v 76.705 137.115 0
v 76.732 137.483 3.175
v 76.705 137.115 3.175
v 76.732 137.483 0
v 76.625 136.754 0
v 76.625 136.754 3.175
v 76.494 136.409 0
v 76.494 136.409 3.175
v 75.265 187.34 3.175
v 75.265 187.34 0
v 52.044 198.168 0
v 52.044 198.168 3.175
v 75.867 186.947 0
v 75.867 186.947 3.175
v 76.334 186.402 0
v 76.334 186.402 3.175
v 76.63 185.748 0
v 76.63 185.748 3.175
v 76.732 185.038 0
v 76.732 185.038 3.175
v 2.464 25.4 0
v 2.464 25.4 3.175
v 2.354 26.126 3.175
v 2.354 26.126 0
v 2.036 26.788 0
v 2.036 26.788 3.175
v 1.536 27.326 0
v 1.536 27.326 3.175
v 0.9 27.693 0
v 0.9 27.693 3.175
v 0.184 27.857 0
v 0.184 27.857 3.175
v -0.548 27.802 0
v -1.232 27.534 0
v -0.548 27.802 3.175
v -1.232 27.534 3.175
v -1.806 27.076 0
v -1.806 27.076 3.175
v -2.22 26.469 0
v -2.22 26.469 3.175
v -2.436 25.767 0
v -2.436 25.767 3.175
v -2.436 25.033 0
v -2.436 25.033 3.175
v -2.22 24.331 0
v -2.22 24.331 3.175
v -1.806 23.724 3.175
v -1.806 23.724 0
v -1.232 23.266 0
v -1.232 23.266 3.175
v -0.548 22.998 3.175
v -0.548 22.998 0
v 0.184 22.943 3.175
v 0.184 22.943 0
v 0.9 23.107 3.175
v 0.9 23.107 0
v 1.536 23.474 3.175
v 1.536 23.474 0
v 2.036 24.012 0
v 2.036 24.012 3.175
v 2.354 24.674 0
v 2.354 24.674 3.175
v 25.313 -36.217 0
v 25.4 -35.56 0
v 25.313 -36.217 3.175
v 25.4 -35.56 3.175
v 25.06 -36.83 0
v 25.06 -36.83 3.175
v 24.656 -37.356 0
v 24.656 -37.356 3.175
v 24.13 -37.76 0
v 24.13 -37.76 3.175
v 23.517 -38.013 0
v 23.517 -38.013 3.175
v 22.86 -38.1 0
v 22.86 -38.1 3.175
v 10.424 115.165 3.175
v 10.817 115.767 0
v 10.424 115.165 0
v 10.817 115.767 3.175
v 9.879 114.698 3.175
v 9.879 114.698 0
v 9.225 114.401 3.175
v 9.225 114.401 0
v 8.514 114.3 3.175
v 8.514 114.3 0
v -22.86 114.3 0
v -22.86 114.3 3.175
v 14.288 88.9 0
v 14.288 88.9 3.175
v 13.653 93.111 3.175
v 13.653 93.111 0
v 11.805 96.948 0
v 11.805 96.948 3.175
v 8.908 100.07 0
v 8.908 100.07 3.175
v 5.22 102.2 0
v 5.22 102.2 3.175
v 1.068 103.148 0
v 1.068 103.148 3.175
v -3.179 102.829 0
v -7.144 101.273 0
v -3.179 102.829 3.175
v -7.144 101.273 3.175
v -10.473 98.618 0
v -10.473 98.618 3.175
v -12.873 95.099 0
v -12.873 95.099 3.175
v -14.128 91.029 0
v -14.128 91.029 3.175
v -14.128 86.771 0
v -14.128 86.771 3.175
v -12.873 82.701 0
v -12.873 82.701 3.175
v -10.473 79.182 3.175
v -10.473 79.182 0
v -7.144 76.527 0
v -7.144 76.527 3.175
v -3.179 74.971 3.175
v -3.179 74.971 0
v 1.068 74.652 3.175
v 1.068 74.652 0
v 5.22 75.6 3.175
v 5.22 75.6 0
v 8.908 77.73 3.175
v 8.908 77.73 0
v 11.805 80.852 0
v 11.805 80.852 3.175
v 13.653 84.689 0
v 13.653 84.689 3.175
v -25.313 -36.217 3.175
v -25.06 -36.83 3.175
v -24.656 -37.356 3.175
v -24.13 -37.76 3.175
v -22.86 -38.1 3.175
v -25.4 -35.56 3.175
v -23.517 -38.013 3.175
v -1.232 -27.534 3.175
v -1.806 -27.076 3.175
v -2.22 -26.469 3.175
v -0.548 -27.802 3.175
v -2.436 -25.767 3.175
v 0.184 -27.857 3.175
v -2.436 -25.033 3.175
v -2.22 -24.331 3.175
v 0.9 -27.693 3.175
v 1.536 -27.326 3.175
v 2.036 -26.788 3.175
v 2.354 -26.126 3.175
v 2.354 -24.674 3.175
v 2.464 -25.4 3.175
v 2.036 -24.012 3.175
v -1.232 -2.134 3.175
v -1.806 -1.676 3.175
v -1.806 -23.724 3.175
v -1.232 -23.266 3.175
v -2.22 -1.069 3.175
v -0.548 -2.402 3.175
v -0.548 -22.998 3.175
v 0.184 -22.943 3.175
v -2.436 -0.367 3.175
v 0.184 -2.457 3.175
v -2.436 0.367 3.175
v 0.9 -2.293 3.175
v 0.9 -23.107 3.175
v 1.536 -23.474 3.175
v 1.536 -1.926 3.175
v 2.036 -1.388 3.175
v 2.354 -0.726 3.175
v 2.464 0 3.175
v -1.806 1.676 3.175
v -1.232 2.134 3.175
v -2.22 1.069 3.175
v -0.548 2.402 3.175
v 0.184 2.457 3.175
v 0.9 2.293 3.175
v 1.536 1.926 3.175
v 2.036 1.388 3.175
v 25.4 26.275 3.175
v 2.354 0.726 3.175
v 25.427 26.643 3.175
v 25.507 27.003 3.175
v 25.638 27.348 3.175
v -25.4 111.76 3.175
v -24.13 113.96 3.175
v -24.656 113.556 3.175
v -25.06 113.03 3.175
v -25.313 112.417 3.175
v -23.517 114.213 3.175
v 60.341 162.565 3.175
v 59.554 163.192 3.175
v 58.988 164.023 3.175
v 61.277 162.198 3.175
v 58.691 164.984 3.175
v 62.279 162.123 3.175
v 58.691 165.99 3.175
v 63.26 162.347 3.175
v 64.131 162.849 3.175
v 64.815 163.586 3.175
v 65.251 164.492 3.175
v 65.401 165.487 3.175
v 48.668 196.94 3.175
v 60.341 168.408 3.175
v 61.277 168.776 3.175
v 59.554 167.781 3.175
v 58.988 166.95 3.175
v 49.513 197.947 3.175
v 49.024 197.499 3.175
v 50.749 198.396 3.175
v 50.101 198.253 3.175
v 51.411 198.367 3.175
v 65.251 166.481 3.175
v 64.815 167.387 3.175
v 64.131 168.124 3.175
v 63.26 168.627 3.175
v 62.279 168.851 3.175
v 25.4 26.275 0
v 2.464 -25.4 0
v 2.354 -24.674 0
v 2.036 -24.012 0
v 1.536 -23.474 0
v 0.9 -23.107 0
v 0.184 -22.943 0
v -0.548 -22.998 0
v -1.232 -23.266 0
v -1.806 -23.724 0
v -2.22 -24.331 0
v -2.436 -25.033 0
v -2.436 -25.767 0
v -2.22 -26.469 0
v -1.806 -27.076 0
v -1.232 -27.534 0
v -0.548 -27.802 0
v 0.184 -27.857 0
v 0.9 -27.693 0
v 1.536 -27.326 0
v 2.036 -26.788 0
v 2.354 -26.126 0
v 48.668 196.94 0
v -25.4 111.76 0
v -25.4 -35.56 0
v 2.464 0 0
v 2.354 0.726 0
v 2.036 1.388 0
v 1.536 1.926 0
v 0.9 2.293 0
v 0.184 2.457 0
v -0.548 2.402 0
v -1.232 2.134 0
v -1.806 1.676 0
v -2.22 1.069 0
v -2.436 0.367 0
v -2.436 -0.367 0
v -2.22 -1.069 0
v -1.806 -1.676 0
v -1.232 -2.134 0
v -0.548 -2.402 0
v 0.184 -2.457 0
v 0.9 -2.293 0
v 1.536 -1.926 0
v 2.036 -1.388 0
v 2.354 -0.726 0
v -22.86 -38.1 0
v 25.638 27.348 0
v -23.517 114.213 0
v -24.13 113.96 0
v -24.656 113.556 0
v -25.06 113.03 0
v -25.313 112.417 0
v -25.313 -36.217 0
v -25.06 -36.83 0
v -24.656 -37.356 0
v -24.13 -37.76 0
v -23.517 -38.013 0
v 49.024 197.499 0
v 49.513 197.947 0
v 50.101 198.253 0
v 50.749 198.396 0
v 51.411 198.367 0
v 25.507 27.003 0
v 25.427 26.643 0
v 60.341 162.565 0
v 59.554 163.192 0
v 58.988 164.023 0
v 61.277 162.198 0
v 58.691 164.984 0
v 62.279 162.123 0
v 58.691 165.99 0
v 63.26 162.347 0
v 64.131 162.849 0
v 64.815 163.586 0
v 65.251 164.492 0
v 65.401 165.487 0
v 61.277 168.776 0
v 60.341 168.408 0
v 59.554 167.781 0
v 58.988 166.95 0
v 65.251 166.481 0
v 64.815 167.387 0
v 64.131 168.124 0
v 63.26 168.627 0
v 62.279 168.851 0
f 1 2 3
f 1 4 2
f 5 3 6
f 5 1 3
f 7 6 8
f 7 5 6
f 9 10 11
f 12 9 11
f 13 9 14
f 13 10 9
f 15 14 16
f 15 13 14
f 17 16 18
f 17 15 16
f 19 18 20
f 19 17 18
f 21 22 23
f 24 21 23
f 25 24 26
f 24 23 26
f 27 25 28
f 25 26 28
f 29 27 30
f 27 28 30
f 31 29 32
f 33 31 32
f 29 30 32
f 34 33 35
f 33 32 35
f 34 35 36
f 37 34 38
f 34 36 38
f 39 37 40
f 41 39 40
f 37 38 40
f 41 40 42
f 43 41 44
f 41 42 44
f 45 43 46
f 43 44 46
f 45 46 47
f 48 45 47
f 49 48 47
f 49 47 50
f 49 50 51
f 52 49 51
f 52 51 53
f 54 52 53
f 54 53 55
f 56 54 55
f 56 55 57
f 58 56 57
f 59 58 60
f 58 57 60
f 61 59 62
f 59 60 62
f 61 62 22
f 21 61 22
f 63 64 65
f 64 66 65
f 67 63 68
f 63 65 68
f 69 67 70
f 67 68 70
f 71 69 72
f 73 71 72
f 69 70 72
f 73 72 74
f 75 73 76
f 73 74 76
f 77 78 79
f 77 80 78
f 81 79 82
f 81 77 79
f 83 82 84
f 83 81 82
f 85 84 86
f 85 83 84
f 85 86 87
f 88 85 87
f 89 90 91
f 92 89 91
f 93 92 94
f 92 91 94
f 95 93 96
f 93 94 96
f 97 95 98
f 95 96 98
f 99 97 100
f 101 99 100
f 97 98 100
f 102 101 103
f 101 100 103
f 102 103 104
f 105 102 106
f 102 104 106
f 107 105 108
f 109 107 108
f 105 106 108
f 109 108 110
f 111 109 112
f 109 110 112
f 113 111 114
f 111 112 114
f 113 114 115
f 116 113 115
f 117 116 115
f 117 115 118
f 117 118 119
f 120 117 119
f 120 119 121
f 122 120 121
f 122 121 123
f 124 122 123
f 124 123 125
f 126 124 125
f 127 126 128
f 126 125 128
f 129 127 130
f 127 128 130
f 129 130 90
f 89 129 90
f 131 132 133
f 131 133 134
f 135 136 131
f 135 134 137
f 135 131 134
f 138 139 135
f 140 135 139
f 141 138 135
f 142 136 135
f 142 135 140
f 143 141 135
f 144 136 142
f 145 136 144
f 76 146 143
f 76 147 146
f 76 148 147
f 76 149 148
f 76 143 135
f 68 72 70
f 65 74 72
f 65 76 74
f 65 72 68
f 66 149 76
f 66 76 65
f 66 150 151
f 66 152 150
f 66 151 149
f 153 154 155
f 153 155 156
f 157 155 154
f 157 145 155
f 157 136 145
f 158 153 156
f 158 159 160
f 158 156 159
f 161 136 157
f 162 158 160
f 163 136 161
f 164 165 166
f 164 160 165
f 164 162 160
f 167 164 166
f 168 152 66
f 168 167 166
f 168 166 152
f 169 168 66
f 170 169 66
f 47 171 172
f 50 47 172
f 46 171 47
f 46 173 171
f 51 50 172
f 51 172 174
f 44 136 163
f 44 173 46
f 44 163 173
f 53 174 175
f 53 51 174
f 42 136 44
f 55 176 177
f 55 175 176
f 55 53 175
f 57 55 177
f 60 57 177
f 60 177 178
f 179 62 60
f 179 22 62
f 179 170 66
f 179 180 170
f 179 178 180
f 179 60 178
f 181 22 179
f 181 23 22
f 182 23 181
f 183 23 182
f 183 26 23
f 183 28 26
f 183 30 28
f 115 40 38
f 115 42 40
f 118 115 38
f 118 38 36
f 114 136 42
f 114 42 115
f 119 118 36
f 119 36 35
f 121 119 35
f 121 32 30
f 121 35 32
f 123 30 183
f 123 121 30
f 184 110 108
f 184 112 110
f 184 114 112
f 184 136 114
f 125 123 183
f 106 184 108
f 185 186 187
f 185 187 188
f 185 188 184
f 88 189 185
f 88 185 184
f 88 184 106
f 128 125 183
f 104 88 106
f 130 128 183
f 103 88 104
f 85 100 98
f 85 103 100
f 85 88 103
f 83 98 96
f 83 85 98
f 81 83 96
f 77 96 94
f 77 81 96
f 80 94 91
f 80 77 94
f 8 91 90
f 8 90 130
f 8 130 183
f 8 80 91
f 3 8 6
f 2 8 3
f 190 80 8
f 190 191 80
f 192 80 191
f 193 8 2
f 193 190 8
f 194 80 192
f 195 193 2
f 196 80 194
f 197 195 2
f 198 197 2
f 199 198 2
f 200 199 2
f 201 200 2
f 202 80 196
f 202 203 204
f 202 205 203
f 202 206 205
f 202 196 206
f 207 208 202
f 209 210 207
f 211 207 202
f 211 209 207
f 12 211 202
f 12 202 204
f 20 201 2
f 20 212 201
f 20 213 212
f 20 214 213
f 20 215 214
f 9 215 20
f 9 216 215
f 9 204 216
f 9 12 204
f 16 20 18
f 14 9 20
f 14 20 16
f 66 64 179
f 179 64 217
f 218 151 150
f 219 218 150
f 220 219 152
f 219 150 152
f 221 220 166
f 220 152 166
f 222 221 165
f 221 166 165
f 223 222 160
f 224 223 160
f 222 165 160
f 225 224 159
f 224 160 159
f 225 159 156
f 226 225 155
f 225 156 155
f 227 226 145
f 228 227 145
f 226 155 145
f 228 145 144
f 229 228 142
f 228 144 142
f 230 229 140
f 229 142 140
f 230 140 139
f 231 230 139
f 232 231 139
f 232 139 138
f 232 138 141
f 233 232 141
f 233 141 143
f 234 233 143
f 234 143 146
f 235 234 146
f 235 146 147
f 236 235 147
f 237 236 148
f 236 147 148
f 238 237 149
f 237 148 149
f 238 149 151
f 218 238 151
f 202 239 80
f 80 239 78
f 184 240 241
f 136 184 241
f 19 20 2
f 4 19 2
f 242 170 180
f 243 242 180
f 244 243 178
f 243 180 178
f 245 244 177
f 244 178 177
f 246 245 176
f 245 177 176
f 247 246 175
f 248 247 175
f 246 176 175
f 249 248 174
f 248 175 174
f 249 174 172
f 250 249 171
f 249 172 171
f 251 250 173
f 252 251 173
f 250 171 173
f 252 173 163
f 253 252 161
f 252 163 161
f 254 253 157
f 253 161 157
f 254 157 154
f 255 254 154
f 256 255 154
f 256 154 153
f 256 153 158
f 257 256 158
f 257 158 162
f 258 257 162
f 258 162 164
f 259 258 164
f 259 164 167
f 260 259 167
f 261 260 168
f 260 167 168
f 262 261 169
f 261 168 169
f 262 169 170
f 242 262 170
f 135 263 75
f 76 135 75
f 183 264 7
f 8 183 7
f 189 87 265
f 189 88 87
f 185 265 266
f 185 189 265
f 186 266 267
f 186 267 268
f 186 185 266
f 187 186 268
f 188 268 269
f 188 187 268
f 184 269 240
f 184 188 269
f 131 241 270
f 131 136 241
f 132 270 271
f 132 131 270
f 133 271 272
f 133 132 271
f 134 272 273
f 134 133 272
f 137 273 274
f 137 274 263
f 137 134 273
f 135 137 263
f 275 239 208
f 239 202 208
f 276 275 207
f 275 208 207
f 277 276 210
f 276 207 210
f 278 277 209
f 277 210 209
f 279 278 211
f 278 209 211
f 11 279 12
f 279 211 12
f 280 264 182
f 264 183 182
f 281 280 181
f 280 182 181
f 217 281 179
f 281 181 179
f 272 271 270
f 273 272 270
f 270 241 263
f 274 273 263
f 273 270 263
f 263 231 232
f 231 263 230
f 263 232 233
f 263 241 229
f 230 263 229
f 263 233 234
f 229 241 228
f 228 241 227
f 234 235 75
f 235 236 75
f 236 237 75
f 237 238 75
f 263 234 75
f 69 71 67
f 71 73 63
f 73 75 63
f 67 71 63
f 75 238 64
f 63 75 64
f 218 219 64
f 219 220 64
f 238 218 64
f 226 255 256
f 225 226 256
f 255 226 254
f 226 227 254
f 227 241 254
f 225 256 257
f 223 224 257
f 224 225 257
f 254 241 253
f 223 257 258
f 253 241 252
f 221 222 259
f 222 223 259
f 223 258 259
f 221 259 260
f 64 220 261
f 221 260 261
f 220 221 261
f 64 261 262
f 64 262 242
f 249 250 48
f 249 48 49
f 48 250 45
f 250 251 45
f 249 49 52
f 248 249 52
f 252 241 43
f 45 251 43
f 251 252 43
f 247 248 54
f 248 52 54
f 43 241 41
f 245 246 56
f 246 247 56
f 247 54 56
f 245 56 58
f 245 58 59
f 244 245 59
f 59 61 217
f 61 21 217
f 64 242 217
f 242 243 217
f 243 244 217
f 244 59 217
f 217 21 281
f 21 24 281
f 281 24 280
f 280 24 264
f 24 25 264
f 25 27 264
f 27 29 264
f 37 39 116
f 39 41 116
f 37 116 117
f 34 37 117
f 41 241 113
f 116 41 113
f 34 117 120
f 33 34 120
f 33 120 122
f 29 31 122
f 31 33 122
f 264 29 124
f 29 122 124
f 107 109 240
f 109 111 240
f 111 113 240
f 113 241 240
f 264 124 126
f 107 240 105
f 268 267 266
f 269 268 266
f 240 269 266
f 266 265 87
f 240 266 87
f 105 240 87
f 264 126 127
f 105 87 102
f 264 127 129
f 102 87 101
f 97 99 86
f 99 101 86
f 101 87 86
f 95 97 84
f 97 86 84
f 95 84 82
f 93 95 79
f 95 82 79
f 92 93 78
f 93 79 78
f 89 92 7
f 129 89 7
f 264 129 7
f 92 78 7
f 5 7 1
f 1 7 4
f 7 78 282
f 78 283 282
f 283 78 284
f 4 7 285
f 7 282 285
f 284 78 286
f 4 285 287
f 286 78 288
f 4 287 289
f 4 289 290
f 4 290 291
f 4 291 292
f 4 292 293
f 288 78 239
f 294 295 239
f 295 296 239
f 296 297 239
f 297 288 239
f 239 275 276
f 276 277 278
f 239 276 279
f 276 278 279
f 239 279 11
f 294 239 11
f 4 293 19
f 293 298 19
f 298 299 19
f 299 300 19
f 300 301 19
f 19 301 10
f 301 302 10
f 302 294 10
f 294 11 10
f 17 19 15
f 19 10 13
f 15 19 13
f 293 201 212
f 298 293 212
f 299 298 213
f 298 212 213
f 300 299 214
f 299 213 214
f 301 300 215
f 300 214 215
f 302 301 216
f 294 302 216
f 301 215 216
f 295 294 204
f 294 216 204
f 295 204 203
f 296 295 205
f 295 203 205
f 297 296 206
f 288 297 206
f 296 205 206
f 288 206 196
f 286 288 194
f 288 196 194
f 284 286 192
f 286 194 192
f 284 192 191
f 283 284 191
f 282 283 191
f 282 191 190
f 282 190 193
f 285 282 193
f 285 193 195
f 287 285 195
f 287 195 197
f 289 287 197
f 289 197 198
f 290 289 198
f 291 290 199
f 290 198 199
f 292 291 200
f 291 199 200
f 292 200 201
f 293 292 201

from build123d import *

# Parameters (mm, degrees)
BOSS_EXTRUDE1_DEPTH = 3.175
SKETCH2_R           = 3.3734375
CUT_EXTRUDE1_DEPTH  = 3.175
SKETCH3_R           = 2.4638
CUT_EXTRUDE2_DEPTH  = 3.175
SKETCH4_R           = 14.2875
CUT_EXTRUDE3_DEPTH  = 3.175
CUT_EXTRUDE4_DEPTH  = 222.091497051
FILLET1_R           = 2.54


with BuildPart() as part:
    # Sketch1 → Boss-Extrude1 (new body)
    with BuildSketch(Plane.XY):
        Polygon((49.741526937, 199.241524535), (10.132643551, 114.3), (-25.4, 114.3), (-25.4, 38.1), (-25.4, -38.1), (25.4, -38.1), (25.4, 26.837911138), (95.781962519, 177.772516839), align=None)
    extrude(amount=BOSS_EXTRUDE1_DEPTH)

    # Sketch2 → Cut-Extrude1 (cut)
    with BuildSketch(Plane.XY.offset(3.175)):
        with Locations((62.02724088, 165.486802896)):
            Circle(SKETCH2_R)
    extrude(amount=-CUT_EXTRUDE1_DEPTH, mode=Mode.SUBTRACT)

    # Sketch3 → Cut-Extrude2 (cut)
    with BuildSketch(Plane.XY.offset(3.175)):
        with Locations((0, -25.4)):
            Circle(SKETCH3_R)
        Circle(SKETCH3_R)
        with Locations((0, 25.4)):
            Circle(SKETCH3_R)
    extrude(amount=-CUT_EXTRUDE2_DEPTH, mode=Mode.SUBTRACT)

    # Sketch4 → Cut-Extrude3 (cut)
    with BuildSketch(Plane.XY.offset(3.175)):
        with Locations((0, 88.9)):
            Circle(SKETCH4_R)
    extrude(amount=-CUT_EXTRUDE3_DEPTH, mode=Mode.SUBTRACT)

    # Sketch5 → Cut-Extrude4 (cut, through all)
    with BuildSketch(Plane.XY.offset(3.175)):
        Polygon((76.731962519, 186.655677727), (76.731962519, 136.919660003), (95.781962519, 177.772516839), align=None)
    extrude(amount=-CUT_EXTRUDE4_DEPTH, mode=Mode.SUBTRACT)

    # Fillet1
    fillet1_edges = [part.edges().sort_by_distance(p)[0] for p in [
        (10.132643551, 114.3, 1.5875),
        (49.741526937, 199.241524535, 1.5875),
        (25.4, 26.837911138, 1.5875),
        (25.4, -38.1, 1.5875),
        (-25.4, -38.1, 1.5875),
        (-25.4, 114.3, 1.5875),
        (76.731962519, 186.655677727, 1.5875),
        (76.731962519, 136.919660003, 1.5875),
    ]]
    fillet(fillet1_edges, radius=FILLET1_R)


solid = part.part
